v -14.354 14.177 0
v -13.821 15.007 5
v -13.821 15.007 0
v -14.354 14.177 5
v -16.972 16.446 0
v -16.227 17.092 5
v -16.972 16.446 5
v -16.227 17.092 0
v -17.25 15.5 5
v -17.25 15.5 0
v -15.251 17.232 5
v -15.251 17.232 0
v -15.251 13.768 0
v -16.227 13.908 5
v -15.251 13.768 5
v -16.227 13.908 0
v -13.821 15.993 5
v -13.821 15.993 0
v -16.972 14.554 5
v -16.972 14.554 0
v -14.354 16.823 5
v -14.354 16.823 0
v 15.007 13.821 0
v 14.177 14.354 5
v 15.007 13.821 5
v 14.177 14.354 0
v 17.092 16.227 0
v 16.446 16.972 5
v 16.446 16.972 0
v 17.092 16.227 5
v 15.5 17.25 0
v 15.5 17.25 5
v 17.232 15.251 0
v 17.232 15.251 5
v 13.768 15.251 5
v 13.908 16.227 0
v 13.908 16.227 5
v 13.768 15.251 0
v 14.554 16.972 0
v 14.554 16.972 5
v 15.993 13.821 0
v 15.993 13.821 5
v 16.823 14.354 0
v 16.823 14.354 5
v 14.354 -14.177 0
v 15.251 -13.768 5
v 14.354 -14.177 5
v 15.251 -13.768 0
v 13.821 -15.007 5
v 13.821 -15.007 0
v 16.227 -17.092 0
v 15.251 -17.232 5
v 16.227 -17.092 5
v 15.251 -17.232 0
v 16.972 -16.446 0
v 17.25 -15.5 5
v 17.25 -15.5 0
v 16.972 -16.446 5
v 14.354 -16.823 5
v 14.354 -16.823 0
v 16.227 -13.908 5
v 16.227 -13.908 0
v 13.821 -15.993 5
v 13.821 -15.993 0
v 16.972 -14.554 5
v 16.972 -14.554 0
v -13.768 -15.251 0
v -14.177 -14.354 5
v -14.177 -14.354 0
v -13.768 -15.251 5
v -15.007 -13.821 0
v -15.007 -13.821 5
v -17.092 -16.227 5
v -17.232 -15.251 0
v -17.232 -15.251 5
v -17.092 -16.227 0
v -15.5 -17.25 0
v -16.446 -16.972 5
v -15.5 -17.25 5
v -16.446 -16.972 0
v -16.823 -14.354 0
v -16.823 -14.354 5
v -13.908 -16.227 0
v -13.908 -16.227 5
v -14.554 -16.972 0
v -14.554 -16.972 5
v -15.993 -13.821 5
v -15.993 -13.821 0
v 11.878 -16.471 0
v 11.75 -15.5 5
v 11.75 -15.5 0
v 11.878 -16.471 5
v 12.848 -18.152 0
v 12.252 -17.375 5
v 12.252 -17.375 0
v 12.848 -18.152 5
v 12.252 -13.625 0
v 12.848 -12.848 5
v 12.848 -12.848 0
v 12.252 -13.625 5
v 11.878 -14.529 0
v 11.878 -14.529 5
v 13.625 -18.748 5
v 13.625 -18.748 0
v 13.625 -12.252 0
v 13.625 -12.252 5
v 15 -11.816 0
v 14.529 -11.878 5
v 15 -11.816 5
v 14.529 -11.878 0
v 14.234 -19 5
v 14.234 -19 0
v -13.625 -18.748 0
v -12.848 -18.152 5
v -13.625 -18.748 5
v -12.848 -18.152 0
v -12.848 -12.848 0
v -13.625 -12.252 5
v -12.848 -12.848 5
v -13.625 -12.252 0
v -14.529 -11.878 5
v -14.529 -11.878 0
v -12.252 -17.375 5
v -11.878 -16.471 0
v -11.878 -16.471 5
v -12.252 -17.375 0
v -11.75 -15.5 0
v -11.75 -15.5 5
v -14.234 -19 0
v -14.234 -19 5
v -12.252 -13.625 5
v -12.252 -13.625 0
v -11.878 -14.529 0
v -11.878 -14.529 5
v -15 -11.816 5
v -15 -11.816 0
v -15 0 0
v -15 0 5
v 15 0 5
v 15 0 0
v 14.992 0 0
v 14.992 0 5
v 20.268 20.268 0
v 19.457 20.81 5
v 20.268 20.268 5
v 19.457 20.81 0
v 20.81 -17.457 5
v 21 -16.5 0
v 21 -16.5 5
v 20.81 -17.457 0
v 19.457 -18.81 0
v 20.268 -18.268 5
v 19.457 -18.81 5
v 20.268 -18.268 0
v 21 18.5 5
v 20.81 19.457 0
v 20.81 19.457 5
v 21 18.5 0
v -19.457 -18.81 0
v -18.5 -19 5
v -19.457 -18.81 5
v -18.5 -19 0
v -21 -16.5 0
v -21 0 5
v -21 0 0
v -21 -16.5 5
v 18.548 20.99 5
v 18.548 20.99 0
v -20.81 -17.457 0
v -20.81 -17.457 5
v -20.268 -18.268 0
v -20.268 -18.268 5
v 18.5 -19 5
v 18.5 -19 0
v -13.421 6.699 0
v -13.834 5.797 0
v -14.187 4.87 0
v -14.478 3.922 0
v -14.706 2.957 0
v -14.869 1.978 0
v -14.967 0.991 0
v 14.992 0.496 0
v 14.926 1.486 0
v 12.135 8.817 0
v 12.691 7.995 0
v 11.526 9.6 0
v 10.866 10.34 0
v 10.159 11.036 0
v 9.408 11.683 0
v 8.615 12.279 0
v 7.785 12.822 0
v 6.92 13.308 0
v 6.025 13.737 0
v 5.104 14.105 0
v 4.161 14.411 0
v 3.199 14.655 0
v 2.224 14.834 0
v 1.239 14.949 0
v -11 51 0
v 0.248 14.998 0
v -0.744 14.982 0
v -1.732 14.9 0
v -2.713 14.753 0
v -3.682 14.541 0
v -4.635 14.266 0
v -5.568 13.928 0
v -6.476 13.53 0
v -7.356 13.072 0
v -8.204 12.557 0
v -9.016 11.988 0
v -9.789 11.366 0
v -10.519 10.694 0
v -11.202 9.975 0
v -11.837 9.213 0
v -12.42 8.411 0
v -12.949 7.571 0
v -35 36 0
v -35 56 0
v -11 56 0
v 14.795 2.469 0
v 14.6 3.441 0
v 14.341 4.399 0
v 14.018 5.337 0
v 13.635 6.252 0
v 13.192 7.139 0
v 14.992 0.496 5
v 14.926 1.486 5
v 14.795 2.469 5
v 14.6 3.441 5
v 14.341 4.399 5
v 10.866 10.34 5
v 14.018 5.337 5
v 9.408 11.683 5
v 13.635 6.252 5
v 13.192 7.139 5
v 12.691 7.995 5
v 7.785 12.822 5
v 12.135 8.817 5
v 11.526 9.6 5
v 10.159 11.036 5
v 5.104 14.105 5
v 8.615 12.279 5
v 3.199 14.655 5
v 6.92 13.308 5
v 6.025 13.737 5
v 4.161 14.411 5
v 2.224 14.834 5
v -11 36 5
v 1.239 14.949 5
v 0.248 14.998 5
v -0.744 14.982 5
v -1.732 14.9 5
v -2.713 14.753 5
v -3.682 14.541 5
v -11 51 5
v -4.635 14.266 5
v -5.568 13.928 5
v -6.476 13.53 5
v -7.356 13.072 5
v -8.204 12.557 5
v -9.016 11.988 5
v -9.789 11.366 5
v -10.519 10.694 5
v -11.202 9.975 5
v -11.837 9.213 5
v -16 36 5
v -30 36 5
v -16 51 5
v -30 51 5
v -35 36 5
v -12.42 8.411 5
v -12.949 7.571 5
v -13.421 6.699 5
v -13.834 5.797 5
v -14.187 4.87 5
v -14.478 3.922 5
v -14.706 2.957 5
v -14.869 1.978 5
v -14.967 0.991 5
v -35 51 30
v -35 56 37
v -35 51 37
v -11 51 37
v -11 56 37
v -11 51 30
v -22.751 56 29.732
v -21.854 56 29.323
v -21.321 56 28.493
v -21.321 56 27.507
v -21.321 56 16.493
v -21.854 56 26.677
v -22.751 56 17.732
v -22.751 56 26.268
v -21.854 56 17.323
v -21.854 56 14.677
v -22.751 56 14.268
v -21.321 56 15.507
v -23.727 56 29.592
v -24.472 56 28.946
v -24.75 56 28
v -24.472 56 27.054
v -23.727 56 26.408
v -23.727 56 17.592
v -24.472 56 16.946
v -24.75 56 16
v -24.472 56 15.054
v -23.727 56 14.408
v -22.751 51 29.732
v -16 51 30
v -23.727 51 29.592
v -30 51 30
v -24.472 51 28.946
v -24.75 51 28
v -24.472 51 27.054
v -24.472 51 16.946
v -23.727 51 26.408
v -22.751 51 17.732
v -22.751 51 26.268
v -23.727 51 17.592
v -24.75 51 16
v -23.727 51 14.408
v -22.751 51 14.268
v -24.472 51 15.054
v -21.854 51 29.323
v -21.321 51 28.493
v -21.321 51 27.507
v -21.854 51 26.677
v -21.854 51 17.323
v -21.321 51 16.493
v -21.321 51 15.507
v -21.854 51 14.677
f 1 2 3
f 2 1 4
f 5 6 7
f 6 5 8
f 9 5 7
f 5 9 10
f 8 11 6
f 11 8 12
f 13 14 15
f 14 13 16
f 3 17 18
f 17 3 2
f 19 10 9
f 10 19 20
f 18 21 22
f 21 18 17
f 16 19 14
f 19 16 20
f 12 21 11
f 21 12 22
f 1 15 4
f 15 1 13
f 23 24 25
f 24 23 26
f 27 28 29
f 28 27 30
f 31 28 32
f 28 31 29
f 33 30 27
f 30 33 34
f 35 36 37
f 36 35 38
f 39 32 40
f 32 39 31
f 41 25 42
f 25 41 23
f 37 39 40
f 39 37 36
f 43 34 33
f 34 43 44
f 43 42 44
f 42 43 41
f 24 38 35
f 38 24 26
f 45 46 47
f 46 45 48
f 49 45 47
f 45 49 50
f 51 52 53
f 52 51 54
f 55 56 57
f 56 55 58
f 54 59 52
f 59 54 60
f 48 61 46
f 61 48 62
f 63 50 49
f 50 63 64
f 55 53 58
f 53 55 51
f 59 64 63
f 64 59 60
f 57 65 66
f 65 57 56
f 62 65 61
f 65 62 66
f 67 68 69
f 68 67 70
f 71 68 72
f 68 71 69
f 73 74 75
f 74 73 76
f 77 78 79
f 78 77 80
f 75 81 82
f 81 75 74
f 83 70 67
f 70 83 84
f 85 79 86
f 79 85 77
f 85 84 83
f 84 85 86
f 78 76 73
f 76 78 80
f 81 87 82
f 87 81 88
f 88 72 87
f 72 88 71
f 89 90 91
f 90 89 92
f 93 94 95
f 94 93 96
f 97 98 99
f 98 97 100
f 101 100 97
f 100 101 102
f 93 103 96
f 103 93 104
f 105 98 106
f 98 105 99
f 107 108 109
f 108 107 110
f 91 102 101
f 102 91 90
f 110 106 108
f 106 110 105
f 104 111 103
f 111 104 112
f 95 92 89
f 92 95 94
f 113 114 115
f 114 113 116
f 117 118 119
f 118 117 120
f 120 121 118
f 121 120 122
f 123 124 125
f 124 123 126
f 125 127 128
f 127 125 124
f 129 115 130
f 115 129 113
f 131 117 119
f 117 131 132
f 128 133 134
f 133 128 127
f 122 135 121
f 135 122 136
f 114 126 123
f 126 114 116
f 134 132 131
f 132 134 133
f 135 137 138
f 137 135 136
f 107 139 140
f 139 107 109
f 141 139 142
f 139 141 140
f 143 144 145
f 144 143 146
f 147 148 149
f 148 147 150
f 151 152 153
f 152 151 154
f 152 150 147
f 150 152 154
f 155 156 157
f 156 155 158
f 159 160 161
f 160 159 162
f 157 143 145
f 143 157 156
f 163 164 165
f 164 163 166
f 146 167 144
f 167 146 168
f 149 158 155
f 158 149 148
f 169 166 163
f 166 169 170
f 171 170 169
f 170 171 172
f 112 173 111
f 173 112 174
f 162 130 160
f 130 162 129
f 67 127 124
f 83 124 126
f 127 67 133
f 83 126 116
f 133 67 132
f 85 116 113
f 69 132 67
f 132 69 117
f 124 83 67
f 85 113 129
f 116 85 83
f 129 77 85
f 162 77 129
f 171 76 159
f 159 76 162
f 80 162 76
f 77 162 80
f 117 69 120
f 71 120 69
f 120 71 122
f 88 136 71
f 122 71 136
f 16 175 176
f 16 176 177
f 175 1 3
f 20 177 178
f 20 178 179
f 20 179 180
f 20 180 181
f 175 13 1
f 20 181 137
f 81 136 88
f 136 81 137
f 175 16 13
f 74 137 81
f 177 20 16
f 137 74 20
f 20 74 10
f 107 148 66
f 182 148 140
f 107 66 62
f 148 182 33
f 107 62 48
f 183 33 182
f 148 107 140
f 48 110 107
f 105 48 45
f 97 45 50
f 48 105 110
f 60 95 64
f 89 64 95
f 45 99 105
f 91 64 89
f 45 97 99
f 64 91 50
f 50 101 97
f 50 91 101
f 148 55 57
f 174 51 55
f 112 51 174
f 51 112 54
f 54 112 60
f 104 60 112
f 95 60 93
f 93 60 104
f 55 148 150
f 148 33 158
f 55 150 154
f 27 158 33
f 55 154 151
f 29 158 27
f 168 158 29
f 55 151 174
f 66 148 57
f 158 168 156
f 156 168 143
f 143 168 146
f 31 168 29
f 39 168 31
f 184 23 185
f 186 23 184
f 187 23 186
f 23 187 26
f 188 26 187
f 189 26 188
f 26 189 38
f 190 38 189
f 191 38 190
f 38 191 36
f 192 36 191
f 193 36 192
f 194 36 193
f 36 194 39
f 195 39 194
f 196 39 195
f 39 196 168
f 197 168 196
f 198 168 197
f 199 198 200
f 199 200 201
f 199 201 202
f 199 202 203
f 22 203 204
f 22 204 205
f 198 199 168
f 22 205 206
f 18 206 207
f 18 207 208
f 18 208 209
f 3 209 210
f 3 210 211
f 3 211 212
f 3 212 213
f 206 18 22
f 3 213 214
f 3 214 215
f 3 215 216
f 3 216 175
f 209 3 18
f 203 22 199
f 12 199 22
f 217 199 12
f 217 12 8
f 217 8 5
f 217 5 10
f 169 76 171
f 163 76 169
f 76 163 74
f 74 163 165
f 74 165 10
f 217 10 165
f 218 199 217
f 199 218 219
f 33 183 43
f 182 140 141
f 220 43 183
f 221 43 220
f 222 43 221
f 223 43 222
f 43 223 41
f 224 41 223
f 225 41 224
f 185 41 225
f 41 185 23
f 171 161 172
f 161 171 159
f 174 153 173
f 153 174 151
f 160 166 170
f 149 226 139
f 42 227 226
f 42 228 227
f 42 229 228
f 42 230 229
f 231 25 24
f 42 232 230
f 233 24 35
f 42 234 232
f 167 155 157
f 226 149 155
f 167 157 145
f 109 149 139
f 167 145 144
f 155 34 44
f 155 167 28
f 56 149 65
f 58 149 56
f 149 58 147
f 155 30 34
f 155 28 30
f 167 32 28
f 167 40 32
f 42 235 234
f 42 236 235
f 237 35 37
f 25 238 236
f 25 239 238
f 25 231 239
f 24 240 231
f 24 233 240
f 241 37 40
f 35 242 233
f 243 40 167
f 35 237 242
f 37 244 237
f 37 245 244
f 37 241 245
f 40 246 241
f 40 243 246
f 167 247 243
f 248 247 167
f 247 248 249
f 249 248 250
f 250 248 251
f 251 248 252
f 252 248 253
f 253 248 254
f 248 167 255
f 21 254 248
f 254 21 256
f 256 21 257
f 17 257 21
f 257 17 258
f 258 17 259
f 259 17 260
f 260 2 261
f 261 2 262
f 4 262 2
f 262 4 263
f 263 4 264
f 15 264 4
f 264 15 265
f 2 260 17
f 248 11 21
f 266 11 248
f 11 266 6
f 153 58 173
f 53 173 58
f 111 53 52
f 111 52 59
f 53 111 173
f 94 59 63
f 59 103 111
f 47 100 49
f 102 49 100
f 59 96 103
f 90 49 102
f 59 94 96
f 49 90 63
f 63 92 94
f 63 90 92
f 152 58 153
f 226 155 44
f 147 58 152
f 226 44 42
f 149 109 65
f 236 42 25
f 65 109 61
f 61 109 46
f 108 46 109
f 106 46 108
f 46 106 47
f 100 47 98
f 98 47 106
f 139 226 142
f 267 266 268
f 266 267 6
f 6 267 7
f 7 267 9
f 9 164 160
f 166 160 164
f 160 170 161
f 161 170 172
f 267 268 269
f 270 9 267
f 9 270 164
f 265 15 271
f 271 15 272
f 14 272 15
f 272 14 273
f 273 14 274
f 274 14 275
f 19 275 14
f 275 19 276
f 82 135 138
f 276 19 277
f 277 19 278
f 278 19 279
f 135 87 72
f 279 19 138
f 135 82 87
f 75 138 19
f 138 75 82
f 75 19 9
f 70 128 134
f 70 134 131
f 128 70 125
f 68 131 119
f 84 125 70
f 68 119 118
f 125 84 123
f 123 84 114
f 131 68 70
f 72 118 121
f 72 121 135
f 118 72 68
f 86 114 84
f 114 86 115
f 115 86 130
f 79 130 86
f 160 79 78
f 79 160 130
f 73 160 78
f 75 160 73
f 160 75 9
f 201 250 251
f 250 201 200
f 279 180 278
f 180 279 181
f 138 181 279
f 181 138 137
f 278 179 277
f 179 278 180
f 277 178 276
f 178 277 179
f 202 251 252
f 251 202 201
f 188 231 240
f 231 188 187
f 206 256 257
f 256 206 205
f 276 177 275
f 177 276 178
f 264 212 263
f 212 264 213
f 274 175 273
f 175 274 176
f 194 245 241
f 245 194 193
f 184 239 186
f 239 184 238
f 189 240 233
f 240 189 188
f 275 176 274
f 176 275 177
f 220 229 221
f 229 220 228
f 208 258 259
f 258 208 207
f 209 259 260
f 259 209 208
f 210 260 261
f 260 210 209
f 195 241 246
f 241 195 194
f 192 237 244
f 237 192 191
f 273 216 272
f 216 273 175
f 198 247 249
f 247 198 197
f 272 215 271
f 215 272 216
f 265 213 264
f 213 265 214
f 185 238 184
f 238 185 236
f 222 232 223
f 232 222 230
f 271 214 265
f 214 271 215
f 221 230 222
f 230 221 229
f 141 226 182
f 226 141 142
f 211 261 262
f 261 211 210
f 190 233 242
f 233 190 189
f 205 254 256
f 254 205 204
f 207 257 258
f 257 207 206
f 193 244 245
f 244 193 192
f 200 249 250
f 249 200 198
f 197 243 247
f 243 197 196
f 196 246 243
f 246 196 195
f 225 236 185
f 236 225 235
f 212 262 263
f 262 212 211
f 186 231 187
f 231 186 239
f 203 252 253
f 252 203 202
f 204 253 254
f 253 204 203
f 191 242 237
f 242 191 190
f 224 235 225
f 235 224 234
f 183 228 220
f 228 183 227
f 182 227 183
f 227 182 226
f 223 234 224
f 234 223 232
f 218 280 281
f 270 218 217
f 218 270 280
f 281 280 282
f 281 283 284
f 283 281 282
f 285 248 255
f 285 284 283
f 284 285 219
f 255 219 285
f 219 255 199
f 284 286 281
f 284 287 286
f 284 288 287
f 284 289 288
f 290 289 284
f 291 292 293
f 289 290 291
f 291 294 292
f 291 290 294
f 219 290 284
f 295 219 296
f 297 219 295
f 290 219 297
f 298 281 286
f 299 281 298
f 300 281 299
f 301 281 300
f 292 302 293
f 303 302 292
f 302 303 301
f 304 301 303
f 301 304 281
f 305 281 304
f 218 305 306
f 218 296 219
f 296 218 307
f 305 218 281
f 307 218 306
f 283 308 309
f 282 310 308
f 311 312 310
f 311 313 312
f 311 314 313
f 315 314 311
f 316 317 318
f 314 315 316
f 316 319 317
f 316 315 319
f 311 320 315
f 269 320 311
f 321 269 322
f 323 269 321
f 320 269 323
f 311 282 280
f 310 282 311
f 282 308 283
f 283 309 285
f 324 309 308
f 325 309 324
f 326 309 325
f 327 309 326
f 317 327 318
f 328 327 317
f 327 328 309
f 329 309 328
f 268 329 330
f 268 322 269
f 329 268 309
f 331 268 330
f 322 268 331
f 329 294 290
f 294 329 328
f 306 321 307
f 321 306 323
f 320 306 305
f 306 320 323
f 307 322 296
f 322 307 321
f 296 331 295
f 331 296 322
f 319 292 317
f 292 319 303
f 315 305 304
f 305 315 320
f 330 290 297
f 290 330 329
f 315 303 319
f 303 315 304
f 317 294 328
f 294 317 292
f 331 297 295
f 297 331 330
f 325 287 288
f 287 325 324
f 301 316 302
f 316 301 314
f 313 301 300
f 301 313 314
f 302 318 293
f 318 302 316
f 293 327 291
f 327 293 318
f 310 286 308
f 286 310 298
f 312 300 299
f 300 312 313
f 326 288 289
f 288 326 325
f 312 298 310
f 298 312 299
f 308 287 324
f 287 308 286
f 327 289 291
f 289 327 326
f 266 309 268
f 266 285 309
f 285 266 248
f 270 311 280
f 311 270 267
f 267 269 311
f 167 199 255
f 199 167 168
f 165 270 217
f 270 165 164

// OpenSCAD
// file: ../parameters.scad
// design tolerance values, used in some places to ensure fit.  You may modify this value depending on the accuracy of your 3D printer
tolerance = .2;

// full width of chain, including walls
outer_width = 24;
// full height of chain, including base
outer_height = 15;

// length of middle section between back and front of link
mid_depth = 6;

// thickness of walls
wall_thickness = 2;

// the "key" is the circular tab that locks the links together and serves as a rotation axle.
key_diameter = 7;
key_depth = 1.1;
// the bottom of the key has a slope to avoid any filament drooping so manual post-processing shouldn't be necessary. You may not need this; it does give the links a slight tendency to snap out if bent beyond the intended range (though this may also be desirable).
key_slope_bottom = 45;

// Z thickness of overall clip
clip_thickness = 2;
// X/Y thickness of curves that make up the "S" clip shape
clip_curve_thickness = 1.75;

end_screw_hole_diameter = 3.5;

_trim = 1;

$fa = 3;
$fs = 1;
// main file
include<../parameters.scad>

thickness = 5;

width = 42;
corner_diameter = 5;
screw_hole_xy = 15.5;
screw_hole_diameter = 3.5;

axle_hole_diameter = 30;

mount_offset_x = -10;
mount_offset_y = 30;
mount_width = outer_width;
mount_depth = 37;
mount_support_height = 15;
mount_support_depth = 25;

$fa = 3;
$fs = 1;

mirror([1,0,0])
union() {
    // motor mount
    difference() {
        // plate
        hull()
        union() {
            translate([(width-corner_diameter)/2, (width-corner_diameter)/2, 0])
            cylinder(d=corner_diameter, h=thickness);

            translate([-(width-corner_diameter)/2, (width-corner_diameter)/2, 0])
            cylinder(d=corner_diameter, h=thickness);

            translate([-(width-corner_diameter)/2, -(width-corner_diameter)/2+2, 0])
            cylinder(d=corner_diameter, h=thickness);

            translate([(width-corner_diameter)/2, -(width-corner_diameter)/2+2, 0])
            cylinder(d=corner_diameter, h=thickness);
        }

        // axle hole
        translate([0, 0, -.1])
        cylinder(d=axle_hole_diameter, h=thickness+.2);

        // screw holes
        for(r=[0, 90, 180, 270])
        rotate([0, 0, r])
        translate([screw_hole_xy, screw_hole_xy, -.1])
        cylinder(d=screw_hole_diameter, h=thickness+.2);

        // belt opening
        difference() {
            translate([-axle_hole_diameter/2, -axle_hole_diameter, -.1])
            cube([axle_hole_diameter, axle_hole_diameter, thickness + .2]);

            // screw holes
            for(r=[0, 90, 180, 270])
            rotate([0, 0, r])
            translate([screw_hole_xy, screw_hole_xy, -.1])
            cylinder(d=screw_hole_diameter+4, h=thickness+.2);
        }
    }

    // support
    translate([-width/2, width/2, 0])
    linear_extrude(height=thickness)
    polygon([
        [0, -corner_diameter/2],
        [width, -corner_diameter/2],
        [width, -width/2],
        [width+mount_offset_x+mount_width, mount_offset_y-mount_support_height],
        [width+mount_offset_x+mount_width, mount_offset_y],
        [width+mount_offset_x, mount_offset_y]
    ]);

    // mounting
    translate([width/2+mount_offset_x, width/2+mount_offset_y, 0])
    union() {
        difference () {
            // mount plate
            cube([mount_width, thickness, mount_depth]);

            translate([mount_width/2, -.1, outer_width/4+thickness*2])
            rotate([-90, 0, 0])
            cylinder(d=end_screw_hole_diameter, h=thickness+.2);

            translate([mount_width/2, -.1, outer_width/4*3+thickness*2])
            rotate([-90, 0, 0])
            cylinder(d=end_screw_hole_diameter, h=thickness+.2);
        }

        // left mount support (from global above)
        translate([thickness, -mount_support_height, thickness])
        rotate([0, -90, 0])
        linear_extrude(height=thickness)
        polygon([
            [0, 0],
            [0, mount_support_height],
            [mount_support_depth, mount_support_height]
        ]);

        // right mount support (from global above)
        translate([mount_width, -mount_support_height, thickness])
        rotate([0, -90, 0])
        linear_extrude(height=thickness)
        polygon([
            [0, 0],
            [0, mount_support_height],
            [mount_support_depth, mount_support_height]
        ]);
    }
}
